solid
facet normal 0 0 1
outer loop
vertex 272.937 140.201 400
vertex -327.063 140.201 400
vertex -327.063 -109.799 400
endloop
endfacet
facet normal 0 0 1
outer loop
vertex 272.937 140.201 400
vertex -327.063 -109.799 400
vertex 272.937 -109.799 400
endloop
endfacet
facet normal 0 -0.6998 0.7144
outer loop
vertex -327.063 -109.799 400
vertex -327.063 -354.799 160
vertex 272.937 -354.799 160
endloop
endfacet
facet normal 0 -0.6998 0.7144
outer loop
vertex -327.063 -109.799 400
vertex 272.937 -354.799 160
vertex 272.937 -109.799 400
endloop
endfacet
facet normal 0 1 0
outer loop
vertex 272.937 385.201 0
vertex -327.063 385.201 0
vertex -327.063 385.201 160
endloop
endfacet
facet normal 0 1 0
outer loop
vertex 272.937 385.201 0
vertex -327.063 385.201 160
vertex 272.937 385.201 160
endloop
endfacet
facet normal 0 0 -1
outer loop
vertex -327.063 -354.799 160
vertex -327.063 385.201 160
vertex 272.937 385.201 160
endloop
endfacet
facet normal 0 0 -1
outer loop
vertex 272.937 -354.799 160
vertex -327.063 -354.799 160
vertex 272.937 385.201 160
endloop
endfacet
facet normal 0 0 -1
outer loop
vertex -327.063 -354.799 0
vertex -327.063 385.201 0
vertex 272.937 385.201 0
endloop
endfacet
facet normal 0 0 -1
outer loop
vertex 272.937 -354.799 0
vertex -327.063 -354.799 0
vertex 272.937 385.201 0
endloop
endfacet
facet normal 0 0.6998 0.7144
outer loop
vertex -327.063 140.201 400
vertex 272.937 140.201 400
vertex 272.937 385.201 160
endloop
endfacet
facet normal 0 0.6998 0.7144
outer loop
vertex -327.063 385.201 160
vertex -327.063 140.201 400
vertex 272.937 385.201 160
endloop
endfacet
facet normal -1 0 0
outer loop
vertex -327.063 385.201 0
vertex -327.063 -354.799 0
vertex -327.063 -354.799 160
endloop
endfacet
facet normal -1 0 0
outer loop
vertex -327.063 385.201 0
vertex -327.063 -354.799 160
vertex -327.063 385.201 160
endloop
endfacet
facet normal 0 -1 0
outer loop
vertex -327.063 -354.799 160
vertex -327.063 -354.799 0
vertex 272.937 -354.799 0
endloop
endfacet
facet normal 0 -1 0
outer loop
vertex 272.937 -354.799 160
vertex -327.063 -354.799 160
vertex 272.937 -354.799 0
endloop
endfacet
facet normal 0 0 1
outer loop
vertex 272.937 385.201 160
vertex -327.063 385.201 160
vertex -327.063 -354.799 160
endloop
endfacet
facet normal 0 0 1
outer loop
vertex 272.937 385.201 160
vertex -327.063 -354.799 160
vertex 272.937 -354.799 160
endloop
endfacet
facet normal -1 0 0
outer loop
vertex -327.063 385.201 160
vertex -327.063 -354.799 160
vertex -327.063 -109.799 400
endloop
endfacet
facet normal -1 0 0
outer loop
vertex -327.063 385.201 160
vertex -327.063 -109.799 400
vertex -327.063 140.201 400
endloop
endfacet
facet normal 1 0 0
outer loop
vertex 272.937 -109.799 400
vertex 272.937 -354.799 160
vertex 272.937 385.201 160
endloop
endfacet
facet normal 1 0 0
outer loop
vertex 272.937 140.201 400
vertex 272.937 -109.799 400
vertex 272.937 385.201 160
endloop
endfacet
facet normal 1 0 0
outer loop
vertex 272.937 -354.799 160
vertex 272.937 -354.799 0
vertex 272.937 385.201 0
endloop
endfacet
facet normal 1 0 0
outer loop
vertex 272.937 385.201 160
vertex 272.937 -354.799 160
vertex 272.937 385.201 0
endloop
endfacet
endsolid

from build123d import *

# Parameters (mm, degrees)
F0_W     = 600
F0_H     = 740
F1_DEPTH = 160
F2_W     = 600
F2_H     = 740
F3_DEPTH = 240
F5_DEPTH = 600.001


with BuildPart() as f1:
    # F0 (on Top) → F1 (new body)
    with BuildSketch(Plane.XY):
        with Locations((-27.062581, 15.200857)):
            Rectangle(F0_W, F0_H)
    extrude(amount=F1_DEPTH)


with BuildPart() as f3:
    # F2 (on face) → F3 (new body)
    with BuildSketch(Plane.XY.offset(160)):
        with Locations((-27.062581, 15.200857)):
            Rectangle(F2_W, F2_H)
    extrude(amount=F3_DEPTH)

    # F4 (on face) → F5 (cut, through all)
    with BuildSketch(Plane.YZ.offset(272.937419)):
        Polygon((-354.799143, 160), (-109.799143, 400), (-354.799143, 400), align=None)
        Polygon((385.200857, 400), (140.200857, 400), (385.200857, 160), align=None)
    extrude(amount=-F5_DEPTH, mode=Mode.SUBTRACT)


solid = Compound([f1.part, f3.part])
